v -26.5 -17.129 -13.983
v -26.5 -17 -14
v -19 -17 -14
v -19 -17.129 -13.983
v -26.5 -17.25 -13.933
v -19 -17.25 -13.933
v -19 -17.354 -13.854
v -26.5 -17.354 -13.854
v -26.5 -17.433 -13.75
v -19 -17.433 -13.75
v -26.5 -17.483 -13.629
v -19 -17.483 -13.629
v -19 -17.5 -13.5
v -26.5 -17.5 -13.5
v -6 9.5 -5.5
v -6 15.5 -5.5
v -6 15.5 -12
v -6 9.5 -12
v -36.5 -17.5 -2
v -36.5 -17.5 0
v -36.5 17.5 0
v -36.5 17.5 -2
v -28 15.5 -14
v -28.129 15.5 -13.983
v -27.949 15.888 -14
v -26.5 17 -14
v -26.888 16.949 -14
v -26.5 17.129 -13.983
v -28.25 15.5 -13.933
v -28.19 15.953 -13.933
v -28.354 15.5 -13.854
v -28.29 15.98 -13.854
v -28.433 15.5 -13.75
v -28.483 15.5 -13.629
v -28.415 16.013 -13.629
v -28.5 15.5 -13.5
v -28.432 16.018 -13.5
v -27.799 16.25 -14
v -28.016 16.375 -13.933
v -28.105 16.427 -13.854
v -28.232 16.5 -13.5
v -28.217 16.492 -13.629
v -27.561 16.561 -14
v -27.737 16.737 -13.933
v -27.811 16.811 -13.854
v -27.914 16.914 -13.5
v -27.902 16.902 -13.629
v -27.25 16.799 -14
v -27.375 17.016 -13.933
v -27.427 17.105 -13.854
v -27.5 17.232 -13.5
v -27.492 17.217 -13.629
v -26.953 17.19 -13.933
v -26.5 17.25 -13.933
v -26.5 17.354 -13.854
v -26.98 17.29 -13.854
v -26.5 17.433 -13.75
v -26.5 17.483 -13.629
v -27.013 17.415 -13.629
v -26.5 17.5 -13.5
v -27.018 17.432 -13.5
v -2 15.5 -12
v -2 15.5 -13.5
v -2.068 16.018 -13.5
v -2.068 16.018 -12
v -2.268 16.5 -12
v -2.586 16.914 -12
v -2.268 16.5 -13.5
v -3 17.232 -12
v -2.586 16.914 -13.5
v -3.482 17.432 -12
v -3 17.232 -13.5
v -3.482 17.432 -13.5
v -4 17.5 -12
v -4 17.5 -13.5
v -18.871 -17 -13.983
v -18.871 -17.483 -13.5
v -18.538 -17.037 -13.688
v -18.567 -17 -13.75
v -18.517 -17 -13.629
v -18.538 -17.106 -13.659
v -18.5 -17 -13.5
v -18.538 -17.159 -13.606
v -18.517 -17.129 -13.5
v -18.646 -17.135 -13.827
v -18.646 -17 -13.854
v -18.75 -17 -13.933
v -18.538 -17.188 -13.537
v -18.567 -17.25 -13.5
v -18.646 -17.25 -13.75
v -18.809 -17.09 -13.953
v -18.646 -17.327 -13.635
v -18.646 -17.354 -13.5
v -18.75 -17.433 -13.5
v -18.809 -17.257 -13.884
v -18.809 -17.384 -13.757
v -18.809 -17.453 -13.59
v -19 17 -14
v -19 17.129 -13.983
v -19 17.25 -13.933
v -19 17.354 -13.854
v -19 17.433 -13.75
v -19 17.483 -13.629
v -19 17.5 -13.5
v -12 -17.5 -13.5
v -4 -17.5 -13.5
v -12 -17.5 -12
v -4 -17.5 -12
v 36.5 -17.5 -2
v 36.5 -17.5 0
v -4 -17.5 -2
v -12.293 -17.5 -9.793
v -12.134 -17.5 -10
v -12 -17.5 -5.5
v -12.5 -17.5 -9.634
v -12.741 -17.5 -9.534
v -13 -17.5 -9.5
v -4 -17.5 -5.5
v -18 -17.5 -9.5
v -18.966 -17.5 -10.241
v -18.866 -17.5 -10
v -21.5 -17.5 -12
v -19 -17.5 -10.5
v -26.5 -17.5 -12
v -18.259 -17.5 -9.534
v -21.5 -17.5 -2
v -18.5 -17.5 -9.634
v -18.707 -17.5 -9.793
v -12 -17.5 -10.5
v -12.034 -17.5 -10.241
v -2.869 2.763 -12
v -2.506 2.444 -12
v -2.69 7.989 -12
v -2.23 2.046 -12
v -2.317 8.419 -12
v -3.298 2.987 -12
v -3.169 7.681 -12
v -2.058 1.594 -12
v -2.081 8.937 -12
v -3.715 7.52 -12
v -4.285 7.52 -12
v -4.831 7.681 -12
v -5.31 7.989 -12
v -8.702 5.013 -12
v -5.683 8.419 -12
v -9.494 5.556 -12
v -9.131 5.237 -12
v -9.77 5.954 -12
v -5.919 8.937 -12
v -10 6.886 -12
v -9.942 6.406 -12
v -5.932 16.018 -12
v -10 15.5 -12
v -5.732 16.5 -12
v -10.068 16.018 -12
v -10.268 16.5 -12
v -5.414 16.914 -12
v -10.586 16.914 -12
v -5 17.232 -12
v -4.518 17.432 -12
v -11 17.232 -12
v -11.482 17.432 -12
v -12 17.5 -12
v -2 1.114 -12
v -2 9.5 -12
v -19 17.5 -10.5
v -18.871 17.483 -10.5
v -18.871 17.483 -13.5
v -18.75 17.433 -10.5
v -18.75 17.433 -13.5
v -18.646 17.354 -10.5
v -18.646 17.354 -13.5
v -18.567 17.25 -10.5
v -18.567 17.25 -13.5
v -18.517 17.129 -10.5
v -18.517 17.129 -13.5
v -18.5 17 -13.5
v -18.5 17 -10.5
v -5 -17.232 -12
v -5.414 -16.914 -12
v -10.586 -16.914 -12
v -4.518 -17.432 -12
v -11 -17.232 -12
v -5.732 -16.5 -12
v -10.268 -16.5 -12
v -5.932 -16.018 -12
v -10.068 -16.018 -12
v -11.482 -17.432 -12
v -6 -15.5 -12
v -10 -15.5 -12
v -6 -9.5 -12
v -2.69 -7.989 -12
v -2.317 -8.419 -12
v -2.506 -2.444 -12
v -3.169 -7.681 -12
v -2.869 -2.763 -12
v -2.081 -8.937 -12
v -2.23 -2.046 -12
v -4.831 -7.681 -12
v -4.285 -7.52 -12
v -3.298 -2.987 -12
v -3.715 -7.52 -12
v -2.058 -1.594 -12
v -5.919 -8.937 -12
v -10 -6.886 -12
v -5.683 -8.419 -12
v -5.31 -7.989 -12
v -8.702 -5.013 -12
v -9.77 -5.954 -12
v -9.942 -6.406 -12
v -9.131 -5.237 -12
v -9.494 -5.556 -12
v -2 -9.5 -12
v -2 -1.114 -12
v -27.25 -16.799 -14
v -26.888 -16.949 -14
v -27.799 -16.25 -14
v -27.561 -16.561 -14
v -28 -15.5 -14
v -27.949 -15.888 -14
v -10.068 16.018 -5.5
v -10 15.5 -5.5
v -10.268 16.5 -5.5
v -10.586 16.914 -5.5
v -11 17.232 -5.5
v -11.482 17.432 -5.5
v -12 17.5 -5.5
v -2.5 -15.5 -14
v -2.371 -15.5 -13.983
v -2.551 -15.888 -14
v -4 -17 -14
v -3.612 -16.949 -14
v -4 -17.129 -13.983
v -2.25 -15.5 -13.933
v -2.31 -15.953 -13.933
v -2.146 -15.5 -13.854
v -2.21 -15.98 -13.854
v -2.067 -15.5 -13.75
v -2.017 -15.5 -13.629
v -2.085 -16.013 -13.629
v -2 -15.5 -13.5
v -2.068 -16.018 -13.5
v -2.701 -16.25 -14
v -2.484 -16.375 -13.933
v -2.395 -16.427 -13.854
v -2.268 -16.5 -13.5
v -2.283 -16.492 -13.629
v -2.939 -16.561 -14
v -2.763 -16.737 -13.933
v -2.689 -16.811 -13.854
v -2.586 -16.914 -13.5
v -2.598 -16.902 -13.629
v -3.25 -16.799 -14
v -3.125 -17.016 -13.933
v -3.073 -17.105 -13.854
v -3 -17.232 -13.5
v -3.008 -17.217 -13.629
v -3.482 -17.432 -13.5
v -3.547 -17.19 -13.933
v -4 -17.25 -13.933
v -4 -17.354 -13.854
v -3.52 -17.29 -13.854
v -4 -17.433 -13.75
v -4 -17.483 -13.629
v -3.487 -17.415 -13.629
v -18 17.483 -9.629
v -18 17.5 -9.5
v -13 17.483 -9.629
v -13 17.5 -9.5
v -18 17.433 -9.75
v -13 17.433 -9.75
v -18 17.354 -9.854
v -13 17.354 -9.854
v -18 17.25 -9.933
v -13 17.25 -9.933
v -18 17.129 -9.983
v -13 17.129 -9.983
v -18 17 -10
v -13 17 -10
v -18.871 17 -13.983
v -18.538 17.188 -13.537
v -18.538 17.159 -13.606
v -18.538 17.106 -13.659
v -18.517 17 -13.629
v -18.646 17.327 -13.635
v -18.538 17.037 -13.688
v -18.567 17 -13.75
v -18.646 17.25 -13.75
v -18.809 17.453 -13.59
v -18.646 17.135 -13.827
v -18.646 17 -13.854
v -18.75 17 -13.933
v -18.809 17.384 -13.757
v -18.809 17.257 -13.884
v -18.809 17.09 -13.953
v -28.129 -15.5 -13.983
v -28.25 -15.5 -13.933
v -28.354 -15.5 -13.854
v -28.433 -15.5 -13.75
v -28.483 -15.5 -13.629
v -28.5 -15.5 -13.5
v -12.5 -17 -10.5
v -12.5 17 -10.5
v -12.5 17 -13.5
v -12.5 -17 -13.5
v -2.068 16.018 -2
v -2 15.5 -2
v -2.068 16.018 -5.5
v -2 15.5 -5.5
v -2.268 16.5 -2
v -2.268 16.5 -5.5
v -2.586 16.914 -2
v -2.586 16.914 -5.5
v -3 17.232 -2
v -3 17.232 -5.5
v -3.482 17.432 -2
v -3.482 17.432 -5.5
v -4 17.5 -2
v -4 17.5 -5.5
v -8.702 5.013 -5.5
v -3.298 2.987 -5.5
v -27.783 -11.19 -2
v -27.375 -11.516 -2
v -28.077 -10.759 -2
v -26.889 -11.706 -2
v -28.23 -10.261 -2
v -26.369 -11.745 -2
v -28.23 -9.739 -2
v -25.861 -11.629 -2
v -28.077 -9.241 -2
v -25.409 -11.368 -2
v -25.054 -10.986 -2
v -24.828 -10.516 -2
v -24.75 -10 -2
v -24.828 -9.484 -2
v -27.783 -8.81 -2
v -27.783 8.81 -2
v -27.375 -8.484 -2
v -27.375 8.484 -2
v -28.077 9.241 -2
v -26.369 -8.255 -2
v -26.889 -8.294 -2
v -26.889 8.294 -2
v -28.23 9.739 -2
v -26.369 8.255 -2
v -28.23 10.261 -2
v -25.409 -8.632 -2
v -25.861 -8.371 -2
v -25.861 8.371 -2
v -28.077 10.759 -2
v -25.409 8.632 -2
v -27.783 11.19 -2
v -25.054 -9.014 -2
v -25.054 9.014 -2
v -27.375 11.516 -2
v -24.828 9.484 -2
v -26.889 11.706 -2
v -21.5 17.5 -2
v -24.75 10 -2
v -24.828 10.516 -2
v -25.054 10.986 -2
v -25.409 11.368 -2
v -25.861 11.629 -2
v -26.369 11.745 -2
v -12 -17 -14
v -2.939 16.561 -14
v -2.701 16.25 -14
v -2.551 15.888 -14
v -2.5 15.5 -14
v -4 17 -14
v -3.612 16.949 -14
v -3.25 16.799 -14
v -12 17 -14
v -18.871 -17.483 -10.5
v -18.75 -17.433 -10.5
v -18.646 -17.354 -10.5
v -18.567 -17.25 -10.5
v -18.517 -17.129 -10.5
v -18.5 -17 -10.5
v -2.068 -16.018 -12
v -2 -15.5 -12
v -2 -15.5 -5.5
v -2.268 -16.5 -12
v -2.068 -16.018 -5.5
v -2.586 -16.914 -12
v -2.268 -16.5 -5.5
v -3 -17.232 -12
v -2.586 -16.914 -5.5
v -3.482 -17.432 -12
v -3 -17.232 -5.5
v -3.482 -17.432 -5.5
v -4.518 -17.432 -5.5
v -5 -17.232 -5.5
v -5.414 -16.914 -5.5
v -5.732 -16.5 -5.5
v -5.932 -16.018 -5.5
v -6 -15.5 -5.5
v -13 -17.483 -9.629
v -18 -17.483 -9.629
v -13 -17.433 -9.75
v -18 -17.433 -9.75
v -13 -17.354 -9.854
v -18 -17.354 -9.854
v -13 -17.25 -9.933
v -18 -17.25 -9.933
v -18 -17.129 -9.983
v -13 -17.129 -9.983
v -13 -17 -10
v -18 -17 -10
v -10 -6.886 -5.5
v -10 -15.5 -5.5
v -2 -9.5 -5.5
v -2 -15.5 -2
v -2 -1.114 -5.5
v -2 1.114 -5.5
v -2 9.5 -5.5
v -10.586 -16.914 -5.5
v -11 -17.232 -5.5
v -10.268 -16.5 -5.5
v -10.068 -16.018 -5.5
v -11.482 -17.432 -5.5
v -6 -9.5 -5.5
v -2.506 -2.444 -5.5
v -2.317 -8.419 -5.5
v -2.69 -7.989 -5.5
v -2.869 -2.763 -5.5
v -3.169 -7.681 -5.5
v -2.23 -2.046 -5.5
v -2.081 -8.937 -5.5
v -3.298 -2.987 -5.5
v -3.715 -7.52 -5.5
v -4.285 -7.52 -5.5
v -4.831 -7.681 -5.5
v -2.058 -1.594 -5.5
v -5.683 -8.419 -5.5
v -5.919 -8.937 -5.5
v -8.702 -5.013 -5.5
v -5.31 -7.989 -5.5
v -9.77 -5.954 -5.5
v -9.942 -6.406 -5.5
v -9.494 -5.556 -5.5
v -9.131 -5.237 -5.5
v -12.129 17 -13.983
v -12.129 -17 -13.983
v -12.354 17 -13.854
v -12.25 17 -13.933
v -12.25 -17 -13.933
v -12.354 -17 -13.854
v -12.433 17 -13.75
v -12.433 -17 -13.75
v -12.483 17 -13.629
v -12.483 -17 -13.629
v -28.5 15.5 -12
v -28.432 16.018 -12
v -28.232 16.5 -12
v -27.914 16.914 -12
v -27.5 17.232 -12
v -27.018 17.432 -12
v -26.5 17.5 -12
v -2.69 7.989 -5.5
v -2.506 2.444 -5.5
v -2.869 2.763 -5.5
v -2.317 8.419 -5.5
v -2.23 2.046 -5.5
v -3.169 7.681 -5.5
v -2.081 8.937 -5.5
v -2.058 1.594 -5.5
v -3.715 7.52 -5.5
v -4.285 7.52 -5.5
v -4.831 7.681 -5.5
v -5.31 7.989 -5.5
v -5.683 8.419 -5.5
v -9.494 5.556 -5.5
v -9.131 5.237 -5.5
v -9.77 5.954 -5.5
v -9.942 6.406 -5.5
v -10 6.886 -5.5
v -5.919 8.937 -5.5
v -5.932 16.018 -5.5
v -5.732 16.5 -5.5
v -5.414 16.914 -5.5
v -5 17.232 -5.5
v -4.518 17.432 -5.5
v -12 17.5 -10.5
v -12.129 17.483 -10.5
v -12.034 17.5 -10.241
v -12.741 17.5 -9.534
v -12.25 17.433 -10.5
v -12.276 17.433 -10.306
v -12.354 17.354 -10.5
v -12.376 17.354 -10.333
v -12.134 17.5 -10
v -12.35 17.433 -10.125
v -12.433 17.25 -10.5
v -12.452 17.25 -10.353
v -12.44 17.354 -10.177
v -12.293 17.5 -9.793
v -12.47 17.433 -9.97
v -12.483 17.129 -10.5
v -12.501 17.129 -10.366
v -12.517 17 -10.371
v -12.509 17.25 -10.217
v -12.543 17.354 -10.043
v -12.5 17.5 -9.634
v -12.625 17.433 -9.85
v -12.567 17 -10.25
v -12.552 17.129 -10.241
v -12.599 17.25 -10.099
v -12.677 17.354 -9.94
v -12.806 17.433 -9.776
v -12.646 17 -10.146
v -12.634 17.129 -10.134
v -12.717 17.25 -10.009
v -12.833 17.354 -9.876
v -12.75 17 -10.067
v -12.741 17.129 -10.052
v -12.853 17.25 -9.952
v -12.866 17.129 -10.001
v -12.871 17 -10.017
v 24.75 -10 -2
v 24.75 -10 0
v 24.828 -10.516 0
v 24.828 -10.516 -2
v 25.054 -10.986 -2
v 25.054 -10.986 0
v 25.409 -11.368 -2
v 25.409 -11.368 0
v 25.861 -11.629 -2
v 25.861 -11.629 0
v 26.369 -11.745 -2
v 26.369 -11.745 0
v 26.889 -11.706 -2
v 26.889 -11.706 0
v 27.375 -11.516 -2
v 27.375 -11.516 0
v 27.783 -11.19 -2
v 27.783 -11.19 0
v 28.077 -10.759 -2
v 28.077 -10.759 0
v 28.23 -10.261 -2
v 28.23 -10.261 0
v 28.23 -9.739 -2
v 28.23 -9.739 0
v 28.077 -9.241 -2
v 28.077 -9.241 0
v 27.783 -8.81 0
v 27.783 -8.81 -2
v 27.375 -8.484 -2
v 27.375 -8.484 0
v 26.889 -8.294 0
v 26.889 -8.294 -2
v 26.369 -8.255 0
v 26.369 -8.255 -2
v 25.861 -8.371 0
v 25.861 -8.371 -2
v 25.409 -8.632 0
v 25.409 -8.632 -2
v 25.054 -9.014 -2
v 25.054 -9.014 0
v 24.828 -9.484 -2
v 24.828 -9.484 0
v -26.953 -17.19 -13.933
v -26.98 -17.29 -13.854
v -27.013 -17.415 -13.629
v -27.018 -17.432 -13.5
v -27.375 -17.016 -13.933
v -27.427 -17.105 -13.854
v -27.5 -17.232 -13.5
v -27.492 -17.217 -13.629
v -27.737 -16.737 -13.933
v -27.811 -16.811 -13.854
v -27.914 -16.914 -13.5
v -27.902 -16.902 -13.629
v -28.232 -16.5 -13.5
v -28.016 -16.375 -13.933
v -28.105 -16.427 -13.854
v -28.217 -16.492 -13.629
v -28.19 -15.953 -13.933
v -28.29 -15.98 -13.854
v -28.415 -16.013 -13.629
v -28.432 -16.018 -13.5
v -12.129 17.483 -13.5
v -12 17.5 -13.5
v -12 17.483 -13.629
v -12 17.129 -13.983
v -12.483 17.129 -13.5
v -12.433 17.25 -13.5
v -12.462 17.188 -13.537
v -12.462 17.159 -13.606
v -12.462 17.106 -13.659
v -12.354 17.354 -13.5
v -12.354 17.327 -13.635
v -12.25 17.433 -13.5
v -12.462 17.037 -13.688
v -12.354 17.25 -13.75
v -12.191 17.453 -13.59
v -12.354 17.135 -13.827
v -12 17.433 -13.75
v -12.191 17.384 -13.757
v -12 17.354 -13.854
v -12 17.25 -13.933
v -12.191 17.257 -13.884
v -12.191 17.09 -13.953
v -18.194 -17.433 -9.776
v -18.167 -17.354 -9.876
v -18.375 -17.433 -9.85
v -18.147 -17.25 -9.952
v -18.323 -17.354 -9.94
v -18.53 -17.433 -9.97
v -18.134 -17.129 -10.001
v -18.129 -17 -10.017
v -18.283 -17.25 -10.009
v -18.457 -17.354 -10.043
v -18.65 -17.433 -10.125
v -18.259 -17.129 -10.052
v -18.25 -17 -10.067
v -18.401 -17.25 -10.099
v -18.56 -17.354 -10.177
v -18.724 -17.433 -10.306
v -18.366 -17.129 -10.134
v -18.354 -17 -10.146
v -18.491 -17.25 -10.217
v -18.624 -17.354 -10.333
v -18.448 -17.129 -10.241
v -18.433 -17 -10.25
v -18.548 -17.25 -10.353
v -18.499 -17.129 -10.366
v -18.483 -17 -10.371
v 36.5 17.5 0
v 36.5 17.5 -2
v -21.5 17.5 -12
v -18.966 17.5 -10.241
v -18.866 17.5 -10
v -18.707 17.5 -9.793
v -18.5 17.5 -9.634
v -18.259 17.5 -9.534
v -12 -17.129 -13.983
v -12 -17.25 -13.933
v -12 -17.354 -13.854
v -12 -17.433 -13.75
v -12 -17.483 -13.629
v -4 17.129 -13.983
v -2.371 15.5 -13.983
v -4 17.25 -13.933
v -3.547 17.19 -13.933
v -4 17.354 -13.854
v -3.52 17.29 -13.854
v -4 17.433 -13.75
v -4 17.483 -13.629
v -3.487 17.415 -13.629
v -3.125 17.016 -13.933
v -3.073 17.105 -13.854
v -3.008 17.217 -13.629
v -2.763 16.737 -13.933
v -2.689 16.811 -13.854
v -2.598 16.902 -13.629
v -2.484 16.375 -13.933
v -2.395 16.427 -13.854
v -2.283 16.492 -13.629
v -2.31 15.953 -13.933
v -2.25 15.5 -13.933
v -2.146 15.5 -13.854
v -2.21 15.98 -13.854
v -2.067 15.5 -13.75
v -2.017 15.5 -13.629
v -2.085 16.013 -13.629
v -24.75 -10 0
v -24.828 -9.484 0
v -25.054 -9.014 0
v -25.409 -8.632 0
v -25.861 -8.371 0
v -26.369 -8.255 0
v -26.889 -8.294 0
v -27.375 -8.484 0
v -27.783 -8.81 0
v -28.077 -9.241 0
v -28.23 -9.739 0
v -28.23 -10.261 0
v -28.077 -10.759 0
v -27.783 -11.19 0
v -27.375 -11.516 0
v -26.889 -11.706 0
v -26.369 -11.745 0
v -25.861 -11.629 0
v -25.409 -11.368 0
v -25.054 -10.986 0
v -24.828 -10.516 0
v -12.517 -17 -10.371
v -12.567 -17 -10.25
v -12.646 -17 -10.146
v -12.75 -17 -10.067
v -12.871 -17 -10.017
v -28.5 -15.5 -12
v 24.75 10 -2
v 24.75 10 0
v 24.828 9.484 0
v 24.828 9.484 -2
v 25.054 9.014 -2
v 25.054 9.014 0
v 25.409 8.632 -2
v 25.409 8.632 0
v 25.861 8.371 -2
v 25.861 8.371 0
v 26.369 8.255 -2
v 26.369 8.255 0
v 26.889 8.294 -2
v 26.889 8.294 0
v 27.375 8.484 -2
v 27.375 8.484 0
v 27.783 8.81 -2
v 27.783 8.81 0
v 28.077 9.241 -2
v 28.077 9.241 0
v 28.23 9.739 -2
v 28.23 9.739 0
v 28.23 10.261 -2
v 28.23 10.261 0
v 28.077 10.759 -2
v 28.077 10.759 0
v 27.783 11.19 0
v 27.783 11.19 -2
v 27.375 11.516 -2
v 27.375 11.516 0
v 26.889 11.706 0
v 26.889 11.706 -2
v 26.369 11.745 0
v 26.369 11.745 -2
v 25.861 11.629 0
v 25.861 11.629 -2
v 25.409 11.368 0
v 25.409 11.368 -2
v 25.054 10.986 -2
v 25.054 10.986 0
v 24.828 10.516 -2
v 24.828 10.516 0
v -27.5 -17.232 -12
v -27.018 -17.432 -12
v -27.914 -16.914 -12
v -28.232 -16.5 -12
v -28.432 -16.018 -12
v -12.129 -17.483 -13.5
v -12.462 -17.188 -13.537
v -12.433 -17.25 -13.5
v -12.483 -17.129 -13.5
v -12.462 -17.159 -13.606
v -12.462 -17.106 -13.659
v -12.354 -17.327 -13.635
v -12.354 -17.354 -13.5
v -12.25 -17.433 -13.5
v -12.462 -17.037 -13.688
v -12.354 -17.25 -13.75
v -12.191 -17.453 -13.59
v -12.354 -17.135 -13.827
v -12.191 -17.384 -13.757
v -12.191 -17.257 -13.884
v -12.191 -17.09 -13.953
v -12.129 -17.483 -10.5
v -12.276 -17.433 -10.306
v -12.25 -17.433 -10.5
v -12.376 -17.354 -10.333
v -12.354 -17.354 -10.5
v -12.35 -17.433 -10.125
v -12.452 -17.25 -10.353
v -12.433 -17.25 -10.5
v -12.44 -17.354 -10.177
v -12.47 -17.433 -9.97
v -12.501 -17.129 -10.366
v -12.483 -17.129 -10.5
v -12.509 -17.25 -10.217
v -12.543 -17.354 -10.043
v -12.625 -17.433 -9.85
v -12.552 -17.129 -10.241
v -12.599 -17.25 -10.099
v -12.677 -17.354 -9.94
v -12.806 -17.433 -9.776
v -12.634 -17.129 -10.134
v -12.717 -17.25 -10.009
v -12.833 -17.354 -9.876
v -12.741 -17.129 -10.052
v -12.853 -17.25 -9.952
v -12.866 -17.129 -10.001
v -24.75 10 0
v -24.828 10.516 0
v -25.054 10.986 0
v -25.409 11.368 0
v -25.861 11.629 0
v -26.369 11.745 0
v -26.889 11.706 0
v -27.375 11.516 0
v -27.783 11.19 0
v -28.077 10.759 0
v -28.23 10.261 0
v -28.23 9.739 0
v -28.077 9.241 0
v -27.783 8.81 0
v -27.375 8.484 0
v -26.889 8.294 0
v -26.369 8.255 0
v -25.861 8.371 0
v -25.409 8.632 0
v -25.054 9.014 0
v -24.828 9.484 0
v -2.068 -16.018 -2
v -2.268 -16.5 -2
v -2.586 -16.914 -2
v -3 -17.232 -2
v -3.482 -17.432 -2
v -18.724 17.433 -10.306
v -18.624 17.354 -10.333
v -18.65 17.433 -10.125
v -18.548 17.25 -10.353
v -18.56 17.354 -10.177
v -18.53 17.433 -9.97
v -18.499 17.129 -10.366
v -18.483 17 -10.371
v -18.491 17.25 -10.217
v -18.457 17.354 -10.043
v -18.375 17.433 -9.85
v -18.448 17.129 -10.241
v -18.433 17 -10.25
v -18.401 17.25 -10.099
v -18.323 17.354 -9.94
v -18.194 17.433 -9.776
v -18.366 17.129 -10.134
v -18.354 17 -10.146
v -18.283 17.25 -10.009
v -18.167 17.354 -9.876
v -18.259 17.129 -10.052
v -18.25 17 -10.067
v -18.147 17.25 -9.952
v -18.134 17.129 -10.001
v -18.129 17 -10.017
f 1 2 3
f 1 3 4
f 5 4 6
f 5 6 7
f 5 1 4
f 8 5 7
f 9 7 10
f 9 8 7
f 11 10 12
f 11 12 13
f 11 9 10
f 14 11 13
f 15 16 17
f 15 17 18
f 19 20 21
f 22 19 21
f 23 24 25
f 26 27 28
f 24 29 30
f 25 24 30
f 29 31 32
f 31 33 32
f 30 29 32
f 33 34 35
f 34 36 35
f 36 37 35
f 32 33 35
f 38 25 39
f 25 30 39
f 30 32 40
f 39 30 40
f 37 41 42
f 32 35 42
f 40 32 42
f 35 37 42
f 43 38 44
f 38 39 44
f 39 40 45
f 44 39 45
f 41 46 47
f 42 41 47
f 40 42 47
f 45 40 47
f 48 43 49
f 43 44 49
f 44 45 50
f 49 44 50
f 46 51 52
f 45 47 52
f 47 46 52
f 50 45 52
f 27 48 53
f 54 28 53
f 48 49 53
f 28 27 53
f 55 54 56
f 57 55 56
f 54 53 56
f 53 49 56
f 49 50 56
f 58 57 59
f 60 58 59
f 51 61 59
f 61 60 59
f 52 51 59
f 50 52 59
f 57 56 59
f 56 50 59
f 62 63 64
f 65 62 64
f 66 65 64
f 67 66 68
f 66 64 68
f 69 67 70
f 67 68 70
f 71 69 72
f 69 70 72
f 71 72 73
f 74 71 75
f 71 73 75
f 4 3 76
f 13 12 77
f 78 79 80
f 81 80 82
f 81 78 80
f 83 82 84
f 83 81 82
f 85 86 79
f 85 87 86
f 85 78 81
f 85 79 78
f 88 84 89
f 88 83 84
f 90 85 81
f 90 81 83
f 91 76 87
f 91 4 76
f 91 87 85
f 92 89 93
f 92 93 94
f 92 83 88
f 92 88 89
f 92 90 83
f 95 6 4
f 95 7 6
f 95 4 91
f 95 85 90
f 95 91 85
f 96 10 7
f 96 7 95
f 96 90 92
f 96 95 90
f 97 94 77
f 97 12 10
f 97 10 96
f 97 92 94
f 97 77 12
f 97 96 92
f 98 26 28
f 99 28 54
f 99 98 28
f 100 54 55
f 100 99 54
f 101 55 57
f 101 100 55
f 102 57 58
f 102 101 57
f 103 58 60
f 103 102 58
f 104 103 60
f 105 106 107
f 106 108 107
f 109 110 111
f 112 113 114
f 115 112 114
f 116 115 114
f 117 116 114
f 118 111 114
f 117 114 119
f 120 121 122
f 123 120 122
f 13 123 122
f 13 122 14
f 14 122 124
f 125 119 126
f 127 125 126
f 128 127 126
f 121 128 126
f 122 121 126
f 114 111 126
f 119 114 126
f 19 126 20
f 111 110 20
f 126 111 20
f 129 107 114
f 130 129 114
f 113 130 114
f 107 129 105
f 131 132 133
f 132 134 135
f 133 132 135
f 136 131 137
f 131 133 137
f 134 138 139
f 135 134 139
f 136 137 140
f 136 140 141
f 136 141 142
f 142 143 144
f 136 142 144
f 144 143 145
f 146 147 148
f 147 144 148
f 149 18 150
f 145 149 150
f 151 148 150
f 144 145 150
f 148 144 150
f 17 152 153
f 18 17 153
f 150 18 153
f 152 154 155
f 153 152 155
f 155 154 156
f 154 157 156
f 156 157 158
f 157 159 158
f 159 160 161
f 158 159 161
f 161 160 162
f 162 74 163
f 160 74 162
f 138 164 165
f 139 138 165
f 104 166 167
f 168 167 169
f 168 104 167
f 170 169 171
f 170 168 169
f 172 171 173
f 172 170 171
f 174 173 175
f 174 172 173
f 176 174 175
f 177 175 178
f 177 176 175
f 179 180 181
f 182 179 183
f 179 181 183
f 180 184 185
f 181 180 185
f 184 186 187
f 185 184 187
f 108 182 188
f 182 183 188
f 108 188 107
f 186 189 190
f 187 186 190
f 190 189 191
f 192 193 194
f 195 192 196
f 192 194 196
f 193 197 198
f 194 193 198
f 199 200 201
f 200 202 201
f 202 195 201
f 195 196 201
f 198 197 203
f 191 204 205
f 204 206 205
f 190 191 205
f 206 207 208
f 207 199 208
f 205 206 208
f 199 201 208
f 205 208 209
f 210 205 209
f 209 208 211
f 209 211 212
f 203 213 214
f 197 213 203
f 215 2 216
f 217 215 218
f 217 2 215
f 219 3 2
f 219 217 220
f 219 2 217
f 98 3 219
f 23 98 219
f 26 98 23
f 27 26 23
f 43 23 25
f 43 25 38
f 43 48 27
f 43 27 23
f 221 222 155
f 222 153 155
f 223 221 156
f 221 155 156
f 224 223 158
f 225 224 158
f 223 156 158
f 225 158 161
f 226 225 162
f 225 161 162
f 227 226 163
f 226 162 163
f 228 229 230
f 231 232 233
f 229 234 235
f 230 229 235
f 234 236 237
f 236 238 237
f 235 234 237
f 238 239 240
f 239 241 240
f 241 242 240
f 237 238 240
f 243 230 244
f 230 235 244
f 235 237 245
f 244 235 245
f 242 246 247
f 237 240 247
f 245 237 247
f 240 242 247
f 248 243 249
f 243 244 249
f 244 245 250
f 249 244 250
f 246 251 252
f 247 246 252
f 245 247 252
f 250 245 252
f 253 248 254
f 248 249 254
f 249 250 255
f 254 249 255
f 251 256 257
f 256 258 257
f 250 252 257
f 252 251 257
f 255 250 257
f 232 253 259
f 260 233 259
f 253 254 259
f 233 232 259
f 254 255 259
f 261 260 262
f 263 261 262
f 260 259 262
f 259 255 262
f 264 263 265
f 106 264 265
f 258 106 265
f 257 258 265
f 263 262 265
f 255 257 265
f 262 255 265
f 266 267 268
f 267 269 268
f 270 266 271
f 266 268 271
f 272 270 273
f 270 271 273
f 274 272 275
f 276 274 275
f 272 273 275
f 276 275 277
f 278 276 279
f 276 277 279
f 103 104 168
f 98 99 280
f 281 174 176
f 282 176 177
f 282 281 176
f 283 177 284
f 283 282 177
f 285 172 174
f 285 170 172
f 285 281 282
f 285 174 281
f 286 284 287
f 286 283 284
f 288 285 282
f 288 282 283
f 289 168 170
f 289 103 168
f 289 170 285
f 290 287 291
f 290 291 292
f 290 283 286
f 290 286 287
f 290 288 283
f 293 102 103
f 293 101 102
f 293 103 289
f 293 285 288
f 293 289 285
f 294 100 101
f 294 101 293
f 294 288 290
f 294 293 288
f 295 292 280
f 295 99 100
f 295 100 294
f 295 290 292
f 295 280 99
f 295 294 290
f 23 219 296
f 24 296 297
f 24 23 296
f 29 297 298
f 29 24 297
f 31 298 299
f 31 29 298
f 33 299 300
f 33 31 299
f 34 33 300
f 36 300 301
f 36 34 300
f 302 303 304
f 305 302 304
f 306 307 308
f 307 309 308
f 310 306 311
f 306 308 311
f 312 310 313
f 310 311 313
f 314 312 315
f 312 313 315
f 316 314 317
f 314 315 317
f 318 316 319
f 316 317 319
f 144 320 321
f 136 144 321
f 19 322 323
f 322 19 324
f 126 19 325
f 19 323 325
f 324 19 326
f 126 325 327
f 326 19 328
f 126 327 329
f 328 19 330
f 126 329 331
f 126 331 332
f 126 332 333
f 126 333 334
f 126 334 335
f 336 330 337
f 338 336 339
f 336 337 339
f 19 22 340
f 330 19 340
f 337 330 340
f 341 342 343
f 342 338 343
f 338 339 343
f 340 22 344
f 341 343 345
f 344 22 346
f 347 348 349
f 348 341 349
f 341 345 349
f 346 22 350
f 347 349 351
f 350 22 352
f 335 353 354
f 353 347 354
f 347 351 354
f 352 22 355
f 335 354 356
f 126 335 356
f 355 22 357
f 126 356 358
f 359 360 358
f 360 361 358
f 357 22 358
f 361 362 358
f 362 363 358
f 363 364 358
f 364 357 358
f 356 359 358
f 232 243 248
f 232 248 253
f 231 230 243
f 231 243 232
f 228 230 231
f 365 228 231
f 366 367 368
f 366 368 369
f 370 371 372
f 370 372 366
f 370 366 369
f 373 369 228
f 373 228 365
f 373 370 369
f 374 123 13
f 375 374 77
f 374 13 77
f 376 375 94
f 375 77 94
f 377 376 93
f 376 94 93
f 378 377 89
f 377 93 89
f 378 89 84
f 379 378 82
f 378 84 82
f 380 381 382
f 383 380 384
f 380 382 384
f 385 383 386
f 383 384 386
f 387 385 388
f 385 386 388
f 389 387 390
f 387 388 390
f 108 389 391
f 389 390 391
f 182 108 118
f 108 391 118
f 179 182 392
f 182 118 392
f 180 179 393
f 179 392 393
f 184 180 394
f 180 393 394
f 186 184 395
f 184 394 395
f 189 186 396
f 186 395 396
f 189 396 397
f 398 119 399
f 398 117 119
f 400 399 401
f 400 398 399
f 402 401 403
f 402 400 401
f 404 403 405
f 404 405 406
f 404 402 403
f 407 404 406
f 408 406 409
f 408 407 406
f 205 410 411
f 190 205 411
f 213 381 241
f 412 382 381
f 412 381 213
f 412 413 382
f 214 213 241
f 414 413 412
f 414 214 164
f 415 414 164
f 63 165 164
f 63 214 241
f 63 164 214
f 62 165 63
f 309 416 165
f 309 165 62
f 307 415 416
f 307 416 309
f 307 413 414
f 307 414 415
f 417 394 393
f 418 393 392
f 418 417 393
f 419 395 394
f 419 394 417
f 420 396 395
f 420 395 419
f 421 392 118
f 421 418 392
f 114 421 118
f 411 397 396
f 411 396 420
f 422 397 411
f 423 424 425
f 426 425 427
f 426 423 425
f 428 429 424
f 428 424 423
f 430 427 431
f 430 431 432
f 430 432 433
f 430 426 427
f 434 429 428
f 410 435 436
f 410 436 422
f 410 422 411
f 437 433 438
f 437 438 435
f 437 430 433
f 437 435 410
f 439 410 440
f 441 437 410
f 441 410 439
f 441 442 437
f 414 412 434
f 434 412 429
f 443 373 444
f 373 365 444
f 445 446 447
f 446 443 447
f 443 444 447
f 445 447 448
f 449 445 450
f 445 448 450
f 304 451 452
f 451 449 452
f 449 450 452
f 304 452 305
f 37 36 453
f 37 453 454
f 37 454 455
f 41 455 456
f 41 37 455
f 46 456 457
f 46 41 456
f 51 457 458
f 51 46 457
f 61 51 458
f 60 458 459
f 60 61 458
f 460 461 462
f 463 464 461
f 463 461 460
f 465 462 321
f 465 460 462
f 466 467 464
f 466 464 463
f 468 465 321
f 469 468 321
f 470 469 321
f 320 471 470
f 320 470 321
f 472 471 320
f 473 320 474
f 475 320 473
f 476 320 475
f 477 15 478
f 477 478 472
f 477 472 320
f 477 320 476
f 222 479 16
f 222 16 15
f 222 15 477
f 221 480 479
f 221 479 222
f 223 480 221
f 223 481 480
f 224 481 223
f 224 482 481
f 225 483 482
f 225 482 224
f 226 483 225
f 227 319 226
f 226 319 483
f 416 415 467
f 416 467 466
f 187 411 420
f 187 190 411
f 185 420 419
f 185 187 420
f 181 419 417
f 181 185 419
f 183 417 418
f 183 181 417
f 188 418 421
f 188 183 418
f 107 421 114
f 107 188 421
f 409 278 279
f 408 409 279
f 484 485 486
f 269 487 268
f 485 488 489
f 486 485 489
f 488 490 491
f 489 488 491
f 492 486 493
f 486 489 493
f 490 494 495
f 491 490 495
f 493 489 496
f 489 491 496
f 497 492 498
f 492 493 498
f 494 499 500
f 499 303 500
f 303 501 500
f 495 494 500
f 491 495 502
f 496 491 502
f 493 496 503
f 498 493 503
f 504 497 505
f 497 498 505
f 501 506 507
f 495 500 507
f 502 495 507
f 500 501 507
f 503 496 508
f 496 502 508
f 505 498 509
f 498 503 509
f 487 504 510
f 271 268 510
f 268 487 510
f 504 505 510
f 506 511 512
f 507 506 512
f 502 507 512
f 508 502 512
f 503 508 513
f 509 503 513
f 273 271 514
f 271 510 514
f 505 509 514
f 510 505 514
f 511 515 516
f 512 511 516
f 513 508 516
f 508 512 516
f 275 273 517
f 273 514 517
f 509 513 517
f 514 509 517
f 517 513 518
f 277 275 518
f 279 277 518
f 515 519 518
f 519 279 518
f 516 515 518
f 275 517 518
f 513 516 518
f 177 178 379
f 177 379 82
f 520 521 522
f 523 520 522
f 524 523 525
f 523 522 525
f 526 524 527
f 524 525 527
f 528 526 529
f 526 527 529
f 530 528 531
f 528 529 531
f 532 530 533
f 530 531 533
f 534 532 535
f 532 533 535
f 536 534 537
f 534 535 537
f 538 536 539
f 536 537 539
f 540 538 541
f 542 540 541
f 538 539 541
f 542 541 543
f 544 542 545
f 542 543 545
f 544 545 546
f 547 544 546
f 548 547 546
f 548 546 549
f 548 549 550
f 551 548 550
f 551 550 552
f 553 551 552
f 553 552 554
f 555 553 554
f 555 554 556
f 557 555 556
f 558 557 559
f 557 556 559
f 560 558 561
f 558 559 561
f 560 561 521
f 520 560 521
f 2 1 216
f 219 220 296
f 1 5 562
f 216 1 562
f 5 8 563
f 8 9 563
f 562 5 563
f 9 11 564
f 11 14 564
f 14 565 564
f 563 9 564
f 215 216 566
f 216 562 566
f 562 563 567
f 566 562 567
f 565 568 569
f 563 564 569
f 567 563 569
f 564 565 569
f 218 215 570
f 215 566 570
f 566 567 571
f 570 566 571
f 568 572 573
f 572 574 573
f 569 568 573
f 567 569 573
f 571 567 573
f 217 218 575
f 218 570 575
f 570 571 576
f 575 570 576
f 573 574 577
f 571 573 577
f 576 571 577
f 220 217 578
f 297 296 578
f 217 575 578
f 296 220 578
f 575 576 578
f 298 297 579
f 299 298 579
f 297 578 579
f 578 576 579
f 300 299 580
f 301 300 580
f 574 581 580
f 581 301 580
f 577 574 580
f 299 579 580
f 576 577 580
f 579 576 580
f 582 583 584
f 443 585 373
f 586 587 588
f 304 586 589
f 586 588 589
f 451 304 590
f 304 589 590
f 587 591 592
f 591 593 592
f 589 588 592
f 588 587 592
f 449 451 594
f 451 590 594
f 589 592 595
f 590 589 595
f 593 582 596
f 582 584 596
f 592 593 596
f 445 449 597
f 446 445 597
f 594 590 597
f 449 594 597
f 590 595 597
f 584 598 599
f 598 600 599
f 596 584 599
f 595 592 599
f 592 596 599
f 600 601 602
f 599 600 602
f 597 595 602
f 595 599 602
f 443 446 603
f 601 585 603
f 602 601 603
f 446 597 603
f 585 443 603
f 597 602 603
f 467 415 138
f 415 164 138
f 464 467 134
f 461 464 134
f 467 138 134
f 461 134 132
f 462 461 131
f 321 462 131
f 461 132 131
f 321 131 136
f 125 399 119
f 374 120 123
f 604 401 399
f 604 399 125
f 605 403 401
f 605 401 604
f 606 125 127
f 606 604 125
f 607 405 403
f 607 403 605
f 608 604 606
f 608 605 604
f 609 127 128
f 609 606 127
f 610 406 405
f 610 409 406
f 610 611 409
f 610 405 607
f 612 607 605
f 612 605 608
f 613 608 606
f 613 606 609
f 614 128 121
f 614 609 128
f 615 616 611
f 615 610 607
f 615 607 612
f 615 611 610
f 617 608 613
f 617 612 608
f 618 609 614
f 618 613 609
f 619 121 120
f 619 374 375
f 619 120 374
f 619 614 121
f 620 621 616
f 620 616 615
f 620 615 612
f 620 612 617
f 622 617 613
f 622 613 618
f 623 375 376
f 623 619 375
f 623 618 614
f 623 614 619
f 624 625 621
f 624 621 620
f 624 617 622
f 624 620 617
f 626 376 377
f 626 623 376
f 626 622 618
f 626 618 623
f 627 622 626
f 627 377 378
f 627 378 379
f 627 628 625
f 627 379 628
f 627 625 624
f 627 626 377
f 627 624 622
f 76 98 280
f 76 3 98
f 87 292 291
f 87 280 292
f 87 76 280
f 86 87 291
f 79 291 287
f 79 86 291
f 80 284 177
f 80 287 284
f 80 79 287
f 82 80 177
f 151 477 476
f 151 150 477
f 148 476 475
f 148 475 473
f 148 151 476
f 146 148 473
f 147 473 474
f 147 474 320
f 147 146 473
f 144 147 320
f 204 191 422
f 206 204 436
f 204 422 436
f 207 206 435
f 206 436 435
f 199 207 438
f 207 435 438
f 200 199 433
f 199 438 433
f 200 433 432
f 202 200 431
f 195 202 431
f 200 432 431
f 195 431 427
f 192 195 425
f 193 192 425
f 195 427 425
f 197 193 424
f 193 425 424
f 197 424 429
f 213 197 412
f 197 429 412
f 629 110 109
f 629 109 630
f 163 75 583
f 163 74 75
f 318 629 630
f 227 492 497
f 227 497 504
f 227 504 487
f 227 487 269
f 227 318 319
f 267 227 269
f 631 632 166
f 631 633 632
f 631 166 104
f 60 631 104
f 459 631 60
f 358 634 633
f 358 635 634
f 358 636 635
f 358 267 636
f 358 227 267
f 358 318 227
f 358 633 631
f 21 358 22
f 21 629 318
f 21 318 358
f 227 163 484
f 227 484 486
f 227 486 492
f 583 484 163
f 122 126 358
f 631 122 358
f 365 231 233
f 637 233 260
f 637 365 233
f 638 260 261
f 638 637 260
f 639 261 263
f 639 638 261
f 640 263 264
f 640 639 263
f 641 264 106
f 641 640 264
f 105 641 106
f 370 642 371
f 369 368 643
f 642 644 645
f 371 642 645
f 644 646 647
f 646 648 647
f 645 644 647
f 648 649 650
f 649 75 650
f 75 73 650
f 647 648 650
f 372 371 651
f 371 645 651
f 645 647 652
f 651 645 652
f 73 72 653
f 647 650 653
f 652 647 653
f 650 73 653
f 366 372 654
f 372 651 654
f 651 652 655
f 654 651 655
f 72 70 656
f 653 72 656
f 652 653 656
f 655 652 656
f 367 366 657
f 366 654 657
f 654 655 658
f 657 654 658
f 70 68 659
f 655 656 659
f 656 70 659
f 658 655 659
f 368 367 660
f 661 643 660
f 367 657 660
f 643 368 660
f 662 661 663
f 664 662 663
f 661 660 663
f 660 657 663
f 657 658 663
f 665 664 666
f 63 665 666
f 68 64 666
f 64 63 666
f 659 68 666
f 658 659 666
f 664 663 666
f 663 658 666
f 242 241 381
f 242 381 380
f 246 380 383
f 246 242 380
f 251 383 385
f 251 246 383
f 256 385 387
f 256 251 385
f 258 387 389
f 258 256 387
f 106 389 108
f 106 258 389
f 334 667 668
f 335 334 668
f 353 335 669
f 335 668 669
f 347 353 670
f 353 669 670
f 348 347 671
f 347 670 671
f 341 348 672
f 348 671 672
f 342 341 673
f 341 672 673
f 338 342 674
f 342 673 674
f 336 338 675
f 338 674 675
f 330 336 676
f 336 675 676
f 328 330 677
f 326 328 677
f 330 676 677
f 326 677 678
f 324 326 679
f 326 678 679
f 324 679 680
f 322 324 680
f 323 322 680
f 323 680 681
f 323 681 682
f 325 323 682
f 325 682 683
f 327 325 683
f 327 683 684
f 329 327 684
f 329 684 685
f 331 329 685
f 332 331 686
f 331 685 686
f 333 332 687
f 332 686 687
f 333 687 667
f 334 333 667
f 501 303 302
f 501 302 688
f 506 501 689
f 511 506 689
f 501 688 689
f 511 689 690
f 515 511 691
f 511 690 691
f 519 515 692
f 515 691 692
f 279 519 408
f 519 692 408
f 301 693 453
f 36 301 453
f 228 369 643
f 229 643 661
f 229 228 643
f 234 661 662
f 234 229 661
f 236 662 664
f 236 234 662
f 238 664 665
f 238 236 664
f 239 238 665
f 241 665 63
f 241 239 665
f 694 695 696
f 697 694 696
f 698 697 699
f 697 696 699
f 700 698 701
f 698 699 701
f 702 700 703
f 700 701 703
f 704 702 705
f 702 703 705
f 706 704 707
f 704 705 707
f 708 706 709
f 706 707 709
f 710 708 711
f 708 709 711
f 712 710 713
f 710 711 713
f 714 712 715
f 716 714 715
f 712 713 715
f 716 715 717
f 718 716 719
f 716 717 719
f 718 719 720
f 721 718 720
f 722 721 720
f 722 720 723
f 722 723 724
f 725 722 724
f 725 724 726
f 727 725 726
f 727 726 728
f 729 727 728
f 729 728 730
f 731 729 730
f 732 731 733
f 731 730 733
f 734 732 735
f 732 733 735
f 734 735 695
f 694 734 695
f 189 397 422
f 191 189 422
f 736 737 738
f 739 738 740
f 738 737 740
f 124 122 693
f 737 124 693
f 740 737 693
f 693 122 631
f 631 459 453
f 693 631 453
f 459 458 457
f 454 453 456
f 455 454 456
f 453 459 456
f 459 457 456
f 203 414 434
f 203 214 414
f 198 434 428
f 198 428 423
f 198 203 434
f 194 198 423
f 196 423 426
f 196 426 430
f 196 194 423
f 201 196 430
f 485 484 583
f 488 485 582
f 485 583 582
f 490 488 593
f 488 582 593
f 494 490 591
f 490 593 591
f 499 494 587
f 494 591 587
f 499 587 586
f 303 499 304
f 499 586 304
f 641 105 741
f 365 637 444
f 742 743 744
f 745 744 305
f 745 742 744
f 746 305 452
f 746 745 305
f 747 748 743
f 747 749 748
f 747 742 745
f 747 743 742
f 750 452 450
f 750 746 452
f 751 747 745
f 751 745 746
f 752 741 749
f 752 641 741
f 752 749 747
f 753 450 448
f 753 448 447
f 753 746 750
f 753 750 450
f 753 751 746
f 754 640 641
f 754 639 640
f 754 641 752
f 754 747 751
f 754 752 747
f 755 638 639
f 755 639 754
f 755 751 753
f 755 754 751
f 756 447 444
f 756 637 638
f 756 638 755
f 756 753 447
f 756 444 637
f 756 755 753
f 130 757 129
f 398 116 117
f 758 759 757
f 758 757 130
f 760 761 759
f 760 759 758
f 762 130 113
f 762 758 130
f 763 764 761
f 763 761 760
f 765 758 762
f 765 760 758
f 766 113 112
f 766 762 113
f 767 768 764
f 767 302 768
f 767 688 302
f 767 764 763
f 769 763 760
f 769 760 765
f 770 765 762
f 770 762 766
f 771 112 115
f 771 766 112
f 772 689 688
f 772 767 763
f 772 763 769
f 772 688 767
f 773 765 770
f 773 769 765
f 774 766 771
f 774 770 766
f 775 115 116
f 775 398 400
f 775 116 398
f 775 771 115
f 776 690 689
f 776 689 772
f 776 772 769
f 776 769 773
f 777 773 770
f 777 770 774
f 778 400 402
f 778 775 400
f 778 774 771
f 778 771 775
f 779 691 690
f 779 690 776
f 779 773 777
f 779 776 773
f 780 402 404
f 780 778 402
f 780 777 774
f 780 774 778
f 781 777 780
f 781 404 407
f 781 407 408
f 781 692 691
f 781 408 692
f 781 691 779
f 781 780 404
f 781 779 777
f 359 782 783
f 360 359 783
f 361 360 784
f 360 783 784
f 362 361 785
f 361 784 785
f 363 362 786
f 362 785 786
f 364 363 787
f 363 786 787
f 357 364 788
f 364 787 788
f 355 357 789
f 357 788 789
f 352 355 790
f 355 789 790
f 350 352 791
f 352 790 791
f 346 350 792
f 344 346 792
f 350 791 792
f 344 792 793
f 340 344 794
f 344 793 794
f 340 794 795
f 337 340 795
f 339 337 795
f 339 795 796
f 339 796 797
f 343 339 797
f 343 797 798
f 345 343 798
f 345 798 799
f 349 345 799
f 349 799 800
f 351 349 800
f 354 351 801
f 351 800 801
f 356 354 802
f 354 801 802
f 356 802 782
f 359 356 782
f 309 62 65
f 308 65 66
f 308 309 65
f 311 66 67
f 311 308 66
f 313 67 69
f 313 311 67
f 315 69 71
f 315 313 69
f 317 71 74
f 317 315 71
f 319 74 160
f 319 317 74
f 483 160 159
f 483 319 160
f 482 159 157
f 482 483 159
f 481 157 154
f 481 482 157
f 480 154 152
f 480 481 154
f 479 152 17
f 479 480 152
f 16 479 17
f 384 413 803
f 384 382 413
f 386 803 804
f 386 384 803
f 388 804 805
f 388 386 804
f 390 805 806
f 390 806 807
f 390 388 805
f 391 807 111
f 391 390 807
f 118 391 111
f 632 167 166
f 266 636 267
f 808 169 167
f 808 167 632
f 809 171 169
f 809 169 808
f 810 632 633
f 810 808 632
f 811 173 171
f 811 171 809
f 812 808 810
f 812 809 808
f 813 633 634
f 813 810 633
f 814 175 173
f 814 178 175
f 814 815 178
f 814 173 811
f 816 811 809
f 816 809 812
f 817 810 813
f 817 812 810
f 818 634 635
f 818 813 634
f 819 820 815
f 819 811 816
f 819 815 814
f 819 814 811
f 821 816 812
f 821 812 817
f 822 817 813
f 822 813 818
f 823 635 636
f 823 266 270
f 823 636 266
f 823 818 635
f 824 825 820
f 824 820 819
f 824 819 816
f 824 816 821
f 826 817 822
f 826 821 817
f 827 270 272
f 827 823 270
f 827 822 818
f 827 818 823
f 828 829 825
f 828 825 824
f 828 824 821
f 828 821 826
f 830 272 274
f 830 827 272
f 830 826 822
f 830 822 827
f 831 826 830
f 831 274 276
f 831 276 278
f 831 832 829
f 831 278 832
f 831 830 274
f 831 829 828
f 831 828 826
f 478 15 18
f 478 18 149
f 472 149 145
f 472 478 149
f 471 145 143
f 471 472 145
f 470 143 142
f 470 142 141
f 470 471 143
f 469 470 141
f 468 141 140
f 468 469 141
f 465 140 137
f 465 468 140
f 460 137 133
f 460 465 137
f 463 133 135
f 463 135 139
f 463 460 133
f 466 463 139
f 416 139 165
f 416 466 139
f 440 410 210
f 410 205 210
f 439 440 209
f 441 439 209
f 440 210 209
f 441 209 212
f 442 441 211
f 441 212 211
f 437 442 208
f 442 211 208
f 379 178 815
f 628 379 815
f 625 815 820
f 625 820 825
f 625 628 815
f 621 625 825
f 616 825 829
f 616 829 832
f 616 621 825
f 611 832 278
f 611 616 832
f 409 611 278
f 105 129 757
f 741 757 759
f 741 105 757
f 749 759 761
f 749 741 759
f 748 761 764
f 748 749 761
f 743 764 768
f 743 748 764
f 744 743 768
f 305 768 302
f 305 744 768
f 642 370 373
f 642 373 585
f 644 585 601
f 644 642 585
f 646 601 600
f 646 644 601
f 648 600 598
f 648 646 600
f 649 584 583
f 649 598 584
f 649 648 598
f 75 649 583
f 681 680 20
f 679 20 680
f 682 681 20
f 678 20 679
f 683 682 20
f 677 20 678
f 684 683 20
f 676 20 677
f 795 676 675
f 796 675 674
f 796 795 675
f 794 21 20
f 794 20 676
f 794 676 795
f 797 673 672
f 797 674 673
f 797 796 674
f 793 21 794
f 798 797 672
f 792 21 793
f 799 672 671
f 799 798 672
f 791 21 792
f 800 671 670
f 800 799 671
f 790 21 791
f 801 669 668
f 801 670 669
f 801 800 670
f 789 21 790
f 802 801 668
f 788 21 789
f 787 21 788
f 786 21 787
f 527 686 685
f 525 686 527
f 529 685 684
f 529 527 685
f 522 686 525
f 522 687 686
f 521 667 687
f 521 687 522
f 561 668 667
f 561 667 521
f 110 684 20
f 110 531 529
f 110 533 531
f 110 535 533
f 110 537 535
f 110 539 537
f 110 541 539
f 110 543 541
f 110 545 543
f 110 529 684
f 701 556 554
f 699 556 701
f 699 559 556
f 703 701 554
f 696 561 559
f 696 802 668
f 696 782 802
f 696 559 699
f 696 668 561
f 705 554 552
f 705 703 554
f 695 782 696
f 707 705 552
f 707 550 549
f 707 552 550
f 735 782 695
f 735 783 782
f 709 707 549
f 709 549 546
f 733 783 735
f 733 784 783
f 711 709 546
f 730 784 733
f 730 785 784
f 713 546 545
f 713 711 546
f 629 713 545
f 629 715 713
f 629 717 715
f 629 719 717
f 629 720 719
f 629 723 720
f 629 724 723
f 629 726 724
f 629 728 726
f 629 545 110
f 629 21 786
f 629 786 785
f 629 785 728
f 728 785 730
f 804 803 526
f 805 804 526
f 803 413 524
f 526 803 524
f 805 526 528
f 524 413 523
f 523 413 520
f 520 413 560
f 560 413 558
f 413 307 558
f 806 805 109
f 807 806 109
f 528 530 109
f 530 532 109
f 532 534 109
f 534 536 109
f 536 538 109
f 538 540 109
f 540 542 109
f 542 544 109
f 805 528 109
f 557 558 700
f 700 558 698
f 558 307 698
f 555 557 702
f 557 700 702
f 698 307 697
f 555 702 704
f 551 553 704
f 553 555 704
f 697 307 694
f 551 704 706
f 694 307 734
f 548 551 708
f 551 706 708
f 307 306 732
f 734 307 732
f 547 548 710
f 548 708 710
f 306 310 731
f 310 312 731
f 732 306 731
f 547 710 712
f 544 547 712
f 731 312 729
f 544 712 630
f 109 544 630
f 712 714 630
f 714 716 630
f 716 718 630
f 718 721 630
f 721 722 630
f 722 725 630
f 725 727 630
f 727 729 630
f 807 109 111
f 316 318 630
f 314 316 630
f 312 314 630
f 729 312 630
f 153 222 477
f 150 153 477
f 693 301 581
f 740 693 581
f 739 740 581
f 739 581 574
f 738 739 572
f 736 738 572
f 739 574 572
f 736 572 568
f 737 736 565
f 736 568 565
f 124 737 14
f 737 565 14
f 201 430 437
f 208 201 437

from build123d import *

# Parameters (mm, degrees)
ESQUISSE1_W             = 73
ESQUISSE1_H             = 35
ESQUISSE1_R             = 1.75
BOSS_EXTRU_1_DEPTH      = 2
BOSS_EXTRU_2_DEPTH      = 10
ESQUISSE3_W             = 26.5
ESQUISSE3_H             = 35
BOSS_EXTRU_3_DEPTH      = 2
ESQUISSE4_W             = 19.5
ESQUISSE4_H             = 35
BOSS_EXTRU_4_DEPTH      = 3.5
CONG_1_R                = 2
ESQUISSE5_W             = 6
ESQUISSE5_H             = 4
ENL_V_MAT_EXTRU_1_DEPTH = 35
CONG_2_R                = 0.5


with BuildPart() as part:
    # Esquisse1 → Boss.-Extru.1 (new body)
    with BuildSketch(Plane.XY):
        Rectangle(ESQUISSE1_W, ESQUISSE1_H)
        with Locations((-26.5, 10)):
            Circle(ESQUISSE1_R, mode=Mode.SUBTRACT)
        with Locations((-26.5, -10)):
            Circle(ESQUISSE1_R, mode=Mode.SUBTRACT)
        with Locations(Location((26.5, -10, 0), (0, 0, 180))):
            Circle(ESQUISSE1_R, mode=Mode.SUBTRACT)
        with Locations(Location((26.5, 10, 0), (0, 0, 180))):
            Circle(ESQUISSE1_R, mode=Mode.SUBTRACT)
    extrude(amount=-BOSS_EXTRU_1_DEPTH)

    # Esquisse2 → Boss.-Extru.2 (add)
    with BuildSketch(Plane(origin=(0, 0, -2), x_dir=(-1, 0, 0), z_dir=(0, 0, -1))):
        with BuildLine():
            Line((6, 15.5), (6, 9.5))
            ThreePointArc((6, 9.5), (4, 7.5), (2, 9.5))
            Line((2, 9.5), (2, 15.5))
            ThreePointArc((2, 15.5), (4, 17.5), (6, 15.5))
        make_face()
        with BuildLine():
            Line((6, -15.5), (6, -9.5))
            ThreePointArc((6, -9.5), (4, -7.5), (2, -9.5))
            Line((2, -9.5), (2, -15.5))
            ThreePointArc((2, -15.5), (4, -17.5), (6, -15.5))
        make_face()
        Polygon((10, 17.5), (10, 5.5), (2, 2.5), (2, -2.5), (10, -5.5), (10, -17.5), (21.5, -17.5), (21.5, 17.5), align=None)
    extrude(amount=BOSS_EXTRU_2_DEPTH)

    # Esquisse3 → Boss.-Extru.3 (add)
    with BuildSketch(Plane(origin=(0, 0, -12), x_dir=(-1, 0, 0), z_dir=(0, 0, -1))):
        with Locations((15.25, 0)):
            Rectangle(ESQUISSE3_W, ESQUISSE3_H)
    extrude(amount=BOSS_EXTRU_3_DEPTH)

    # Esquisse4 → Boss.-Extru.4 (add)
    with BuildSketch(Plane(origin=(0, 0, -2), x_dir=(-1, 0, 0), z_dir=(0, 0, -1))):
        with Locations((11.75, 0)):
            Rectangle(ESQUISSE4_W, ESQUISSE4_H)
    extrude(amount=BOSS_EXTRU_4_DEPTH)

    # Congé1
    cong_1_edges = [part.edges().sort_by_distance(p)[0] for p in [
        (-2, 17.5, -3.75),
        (-2, -17.5, -3.75),
        (-10, 17.5, -8.75),
        (-10, 5.5, -8.75),
        (-2, 2.5, -8.75),
        (-2, -2.5, -8.75),
        (-10, -5.5, -8.75),
        (-10, -17.5, -8.75),
        (-2, 17.5, -13),
        (-2, -17.5, -13),
        (-28.5, -17.5, -13),
        (-28.5, 17.5, -13),
    ]]
    fillet(cong_1_edges, radius=CONG_1_R - 0.0001)  # a hair under: the kernel refuses the full size

    # Esquisse5 → Enlèv. mat.-Extru.1 (cut)
    with BuildSketch(Plane(origin=(0, 17.5, 0), x_dir=(1, 0, 0), z_dir=(0, 1, 0))):
        with Locations((-15.5, 12)):
            Rectangle(ESQUISSE5_W, ESQUISSE5_H)
    extrude(amount=-ENL_V_MAT_EXTRU_1_DEPTH, mode=Mode.SUBTRACT)

    # Congé2
    cong_2_edges = [part.edges().sort_by_distance(p)[0] for p in [
        (-28.5, 0, -14),
        (-8.24995, -17.5, -14),
        (-2, 0, -14),
        (-22.50005, 17.5, -14),
        (-2.585757148, 16.914242852, -14),
        (-2.585757148, -16.914242852, -14),
        (-27.914242852, 16.914242852, -14),
        (-27.914242852, -16.914242852, -14),
        (-22.50005, -17.5, -14),
        (-8.24995, 17.5, -14),
        (-12.5, 17.5, -12),
        (-18.5, 17.5, -12),
        (-15.5, 17.5, -10),
        (-18.5, 0, -14),
        (-18.5, -17.5, -12),
        (-18.5, 0, -10),
        (-15.5, -17.5, -10),
        (-12.5, 0, -10),
        (-12.5, -17.5, -12),
        (-12.5, 0, -14),
    ]]
    fillet(cong_2_edges, radius=CONG_2_R)


solid = part.part
